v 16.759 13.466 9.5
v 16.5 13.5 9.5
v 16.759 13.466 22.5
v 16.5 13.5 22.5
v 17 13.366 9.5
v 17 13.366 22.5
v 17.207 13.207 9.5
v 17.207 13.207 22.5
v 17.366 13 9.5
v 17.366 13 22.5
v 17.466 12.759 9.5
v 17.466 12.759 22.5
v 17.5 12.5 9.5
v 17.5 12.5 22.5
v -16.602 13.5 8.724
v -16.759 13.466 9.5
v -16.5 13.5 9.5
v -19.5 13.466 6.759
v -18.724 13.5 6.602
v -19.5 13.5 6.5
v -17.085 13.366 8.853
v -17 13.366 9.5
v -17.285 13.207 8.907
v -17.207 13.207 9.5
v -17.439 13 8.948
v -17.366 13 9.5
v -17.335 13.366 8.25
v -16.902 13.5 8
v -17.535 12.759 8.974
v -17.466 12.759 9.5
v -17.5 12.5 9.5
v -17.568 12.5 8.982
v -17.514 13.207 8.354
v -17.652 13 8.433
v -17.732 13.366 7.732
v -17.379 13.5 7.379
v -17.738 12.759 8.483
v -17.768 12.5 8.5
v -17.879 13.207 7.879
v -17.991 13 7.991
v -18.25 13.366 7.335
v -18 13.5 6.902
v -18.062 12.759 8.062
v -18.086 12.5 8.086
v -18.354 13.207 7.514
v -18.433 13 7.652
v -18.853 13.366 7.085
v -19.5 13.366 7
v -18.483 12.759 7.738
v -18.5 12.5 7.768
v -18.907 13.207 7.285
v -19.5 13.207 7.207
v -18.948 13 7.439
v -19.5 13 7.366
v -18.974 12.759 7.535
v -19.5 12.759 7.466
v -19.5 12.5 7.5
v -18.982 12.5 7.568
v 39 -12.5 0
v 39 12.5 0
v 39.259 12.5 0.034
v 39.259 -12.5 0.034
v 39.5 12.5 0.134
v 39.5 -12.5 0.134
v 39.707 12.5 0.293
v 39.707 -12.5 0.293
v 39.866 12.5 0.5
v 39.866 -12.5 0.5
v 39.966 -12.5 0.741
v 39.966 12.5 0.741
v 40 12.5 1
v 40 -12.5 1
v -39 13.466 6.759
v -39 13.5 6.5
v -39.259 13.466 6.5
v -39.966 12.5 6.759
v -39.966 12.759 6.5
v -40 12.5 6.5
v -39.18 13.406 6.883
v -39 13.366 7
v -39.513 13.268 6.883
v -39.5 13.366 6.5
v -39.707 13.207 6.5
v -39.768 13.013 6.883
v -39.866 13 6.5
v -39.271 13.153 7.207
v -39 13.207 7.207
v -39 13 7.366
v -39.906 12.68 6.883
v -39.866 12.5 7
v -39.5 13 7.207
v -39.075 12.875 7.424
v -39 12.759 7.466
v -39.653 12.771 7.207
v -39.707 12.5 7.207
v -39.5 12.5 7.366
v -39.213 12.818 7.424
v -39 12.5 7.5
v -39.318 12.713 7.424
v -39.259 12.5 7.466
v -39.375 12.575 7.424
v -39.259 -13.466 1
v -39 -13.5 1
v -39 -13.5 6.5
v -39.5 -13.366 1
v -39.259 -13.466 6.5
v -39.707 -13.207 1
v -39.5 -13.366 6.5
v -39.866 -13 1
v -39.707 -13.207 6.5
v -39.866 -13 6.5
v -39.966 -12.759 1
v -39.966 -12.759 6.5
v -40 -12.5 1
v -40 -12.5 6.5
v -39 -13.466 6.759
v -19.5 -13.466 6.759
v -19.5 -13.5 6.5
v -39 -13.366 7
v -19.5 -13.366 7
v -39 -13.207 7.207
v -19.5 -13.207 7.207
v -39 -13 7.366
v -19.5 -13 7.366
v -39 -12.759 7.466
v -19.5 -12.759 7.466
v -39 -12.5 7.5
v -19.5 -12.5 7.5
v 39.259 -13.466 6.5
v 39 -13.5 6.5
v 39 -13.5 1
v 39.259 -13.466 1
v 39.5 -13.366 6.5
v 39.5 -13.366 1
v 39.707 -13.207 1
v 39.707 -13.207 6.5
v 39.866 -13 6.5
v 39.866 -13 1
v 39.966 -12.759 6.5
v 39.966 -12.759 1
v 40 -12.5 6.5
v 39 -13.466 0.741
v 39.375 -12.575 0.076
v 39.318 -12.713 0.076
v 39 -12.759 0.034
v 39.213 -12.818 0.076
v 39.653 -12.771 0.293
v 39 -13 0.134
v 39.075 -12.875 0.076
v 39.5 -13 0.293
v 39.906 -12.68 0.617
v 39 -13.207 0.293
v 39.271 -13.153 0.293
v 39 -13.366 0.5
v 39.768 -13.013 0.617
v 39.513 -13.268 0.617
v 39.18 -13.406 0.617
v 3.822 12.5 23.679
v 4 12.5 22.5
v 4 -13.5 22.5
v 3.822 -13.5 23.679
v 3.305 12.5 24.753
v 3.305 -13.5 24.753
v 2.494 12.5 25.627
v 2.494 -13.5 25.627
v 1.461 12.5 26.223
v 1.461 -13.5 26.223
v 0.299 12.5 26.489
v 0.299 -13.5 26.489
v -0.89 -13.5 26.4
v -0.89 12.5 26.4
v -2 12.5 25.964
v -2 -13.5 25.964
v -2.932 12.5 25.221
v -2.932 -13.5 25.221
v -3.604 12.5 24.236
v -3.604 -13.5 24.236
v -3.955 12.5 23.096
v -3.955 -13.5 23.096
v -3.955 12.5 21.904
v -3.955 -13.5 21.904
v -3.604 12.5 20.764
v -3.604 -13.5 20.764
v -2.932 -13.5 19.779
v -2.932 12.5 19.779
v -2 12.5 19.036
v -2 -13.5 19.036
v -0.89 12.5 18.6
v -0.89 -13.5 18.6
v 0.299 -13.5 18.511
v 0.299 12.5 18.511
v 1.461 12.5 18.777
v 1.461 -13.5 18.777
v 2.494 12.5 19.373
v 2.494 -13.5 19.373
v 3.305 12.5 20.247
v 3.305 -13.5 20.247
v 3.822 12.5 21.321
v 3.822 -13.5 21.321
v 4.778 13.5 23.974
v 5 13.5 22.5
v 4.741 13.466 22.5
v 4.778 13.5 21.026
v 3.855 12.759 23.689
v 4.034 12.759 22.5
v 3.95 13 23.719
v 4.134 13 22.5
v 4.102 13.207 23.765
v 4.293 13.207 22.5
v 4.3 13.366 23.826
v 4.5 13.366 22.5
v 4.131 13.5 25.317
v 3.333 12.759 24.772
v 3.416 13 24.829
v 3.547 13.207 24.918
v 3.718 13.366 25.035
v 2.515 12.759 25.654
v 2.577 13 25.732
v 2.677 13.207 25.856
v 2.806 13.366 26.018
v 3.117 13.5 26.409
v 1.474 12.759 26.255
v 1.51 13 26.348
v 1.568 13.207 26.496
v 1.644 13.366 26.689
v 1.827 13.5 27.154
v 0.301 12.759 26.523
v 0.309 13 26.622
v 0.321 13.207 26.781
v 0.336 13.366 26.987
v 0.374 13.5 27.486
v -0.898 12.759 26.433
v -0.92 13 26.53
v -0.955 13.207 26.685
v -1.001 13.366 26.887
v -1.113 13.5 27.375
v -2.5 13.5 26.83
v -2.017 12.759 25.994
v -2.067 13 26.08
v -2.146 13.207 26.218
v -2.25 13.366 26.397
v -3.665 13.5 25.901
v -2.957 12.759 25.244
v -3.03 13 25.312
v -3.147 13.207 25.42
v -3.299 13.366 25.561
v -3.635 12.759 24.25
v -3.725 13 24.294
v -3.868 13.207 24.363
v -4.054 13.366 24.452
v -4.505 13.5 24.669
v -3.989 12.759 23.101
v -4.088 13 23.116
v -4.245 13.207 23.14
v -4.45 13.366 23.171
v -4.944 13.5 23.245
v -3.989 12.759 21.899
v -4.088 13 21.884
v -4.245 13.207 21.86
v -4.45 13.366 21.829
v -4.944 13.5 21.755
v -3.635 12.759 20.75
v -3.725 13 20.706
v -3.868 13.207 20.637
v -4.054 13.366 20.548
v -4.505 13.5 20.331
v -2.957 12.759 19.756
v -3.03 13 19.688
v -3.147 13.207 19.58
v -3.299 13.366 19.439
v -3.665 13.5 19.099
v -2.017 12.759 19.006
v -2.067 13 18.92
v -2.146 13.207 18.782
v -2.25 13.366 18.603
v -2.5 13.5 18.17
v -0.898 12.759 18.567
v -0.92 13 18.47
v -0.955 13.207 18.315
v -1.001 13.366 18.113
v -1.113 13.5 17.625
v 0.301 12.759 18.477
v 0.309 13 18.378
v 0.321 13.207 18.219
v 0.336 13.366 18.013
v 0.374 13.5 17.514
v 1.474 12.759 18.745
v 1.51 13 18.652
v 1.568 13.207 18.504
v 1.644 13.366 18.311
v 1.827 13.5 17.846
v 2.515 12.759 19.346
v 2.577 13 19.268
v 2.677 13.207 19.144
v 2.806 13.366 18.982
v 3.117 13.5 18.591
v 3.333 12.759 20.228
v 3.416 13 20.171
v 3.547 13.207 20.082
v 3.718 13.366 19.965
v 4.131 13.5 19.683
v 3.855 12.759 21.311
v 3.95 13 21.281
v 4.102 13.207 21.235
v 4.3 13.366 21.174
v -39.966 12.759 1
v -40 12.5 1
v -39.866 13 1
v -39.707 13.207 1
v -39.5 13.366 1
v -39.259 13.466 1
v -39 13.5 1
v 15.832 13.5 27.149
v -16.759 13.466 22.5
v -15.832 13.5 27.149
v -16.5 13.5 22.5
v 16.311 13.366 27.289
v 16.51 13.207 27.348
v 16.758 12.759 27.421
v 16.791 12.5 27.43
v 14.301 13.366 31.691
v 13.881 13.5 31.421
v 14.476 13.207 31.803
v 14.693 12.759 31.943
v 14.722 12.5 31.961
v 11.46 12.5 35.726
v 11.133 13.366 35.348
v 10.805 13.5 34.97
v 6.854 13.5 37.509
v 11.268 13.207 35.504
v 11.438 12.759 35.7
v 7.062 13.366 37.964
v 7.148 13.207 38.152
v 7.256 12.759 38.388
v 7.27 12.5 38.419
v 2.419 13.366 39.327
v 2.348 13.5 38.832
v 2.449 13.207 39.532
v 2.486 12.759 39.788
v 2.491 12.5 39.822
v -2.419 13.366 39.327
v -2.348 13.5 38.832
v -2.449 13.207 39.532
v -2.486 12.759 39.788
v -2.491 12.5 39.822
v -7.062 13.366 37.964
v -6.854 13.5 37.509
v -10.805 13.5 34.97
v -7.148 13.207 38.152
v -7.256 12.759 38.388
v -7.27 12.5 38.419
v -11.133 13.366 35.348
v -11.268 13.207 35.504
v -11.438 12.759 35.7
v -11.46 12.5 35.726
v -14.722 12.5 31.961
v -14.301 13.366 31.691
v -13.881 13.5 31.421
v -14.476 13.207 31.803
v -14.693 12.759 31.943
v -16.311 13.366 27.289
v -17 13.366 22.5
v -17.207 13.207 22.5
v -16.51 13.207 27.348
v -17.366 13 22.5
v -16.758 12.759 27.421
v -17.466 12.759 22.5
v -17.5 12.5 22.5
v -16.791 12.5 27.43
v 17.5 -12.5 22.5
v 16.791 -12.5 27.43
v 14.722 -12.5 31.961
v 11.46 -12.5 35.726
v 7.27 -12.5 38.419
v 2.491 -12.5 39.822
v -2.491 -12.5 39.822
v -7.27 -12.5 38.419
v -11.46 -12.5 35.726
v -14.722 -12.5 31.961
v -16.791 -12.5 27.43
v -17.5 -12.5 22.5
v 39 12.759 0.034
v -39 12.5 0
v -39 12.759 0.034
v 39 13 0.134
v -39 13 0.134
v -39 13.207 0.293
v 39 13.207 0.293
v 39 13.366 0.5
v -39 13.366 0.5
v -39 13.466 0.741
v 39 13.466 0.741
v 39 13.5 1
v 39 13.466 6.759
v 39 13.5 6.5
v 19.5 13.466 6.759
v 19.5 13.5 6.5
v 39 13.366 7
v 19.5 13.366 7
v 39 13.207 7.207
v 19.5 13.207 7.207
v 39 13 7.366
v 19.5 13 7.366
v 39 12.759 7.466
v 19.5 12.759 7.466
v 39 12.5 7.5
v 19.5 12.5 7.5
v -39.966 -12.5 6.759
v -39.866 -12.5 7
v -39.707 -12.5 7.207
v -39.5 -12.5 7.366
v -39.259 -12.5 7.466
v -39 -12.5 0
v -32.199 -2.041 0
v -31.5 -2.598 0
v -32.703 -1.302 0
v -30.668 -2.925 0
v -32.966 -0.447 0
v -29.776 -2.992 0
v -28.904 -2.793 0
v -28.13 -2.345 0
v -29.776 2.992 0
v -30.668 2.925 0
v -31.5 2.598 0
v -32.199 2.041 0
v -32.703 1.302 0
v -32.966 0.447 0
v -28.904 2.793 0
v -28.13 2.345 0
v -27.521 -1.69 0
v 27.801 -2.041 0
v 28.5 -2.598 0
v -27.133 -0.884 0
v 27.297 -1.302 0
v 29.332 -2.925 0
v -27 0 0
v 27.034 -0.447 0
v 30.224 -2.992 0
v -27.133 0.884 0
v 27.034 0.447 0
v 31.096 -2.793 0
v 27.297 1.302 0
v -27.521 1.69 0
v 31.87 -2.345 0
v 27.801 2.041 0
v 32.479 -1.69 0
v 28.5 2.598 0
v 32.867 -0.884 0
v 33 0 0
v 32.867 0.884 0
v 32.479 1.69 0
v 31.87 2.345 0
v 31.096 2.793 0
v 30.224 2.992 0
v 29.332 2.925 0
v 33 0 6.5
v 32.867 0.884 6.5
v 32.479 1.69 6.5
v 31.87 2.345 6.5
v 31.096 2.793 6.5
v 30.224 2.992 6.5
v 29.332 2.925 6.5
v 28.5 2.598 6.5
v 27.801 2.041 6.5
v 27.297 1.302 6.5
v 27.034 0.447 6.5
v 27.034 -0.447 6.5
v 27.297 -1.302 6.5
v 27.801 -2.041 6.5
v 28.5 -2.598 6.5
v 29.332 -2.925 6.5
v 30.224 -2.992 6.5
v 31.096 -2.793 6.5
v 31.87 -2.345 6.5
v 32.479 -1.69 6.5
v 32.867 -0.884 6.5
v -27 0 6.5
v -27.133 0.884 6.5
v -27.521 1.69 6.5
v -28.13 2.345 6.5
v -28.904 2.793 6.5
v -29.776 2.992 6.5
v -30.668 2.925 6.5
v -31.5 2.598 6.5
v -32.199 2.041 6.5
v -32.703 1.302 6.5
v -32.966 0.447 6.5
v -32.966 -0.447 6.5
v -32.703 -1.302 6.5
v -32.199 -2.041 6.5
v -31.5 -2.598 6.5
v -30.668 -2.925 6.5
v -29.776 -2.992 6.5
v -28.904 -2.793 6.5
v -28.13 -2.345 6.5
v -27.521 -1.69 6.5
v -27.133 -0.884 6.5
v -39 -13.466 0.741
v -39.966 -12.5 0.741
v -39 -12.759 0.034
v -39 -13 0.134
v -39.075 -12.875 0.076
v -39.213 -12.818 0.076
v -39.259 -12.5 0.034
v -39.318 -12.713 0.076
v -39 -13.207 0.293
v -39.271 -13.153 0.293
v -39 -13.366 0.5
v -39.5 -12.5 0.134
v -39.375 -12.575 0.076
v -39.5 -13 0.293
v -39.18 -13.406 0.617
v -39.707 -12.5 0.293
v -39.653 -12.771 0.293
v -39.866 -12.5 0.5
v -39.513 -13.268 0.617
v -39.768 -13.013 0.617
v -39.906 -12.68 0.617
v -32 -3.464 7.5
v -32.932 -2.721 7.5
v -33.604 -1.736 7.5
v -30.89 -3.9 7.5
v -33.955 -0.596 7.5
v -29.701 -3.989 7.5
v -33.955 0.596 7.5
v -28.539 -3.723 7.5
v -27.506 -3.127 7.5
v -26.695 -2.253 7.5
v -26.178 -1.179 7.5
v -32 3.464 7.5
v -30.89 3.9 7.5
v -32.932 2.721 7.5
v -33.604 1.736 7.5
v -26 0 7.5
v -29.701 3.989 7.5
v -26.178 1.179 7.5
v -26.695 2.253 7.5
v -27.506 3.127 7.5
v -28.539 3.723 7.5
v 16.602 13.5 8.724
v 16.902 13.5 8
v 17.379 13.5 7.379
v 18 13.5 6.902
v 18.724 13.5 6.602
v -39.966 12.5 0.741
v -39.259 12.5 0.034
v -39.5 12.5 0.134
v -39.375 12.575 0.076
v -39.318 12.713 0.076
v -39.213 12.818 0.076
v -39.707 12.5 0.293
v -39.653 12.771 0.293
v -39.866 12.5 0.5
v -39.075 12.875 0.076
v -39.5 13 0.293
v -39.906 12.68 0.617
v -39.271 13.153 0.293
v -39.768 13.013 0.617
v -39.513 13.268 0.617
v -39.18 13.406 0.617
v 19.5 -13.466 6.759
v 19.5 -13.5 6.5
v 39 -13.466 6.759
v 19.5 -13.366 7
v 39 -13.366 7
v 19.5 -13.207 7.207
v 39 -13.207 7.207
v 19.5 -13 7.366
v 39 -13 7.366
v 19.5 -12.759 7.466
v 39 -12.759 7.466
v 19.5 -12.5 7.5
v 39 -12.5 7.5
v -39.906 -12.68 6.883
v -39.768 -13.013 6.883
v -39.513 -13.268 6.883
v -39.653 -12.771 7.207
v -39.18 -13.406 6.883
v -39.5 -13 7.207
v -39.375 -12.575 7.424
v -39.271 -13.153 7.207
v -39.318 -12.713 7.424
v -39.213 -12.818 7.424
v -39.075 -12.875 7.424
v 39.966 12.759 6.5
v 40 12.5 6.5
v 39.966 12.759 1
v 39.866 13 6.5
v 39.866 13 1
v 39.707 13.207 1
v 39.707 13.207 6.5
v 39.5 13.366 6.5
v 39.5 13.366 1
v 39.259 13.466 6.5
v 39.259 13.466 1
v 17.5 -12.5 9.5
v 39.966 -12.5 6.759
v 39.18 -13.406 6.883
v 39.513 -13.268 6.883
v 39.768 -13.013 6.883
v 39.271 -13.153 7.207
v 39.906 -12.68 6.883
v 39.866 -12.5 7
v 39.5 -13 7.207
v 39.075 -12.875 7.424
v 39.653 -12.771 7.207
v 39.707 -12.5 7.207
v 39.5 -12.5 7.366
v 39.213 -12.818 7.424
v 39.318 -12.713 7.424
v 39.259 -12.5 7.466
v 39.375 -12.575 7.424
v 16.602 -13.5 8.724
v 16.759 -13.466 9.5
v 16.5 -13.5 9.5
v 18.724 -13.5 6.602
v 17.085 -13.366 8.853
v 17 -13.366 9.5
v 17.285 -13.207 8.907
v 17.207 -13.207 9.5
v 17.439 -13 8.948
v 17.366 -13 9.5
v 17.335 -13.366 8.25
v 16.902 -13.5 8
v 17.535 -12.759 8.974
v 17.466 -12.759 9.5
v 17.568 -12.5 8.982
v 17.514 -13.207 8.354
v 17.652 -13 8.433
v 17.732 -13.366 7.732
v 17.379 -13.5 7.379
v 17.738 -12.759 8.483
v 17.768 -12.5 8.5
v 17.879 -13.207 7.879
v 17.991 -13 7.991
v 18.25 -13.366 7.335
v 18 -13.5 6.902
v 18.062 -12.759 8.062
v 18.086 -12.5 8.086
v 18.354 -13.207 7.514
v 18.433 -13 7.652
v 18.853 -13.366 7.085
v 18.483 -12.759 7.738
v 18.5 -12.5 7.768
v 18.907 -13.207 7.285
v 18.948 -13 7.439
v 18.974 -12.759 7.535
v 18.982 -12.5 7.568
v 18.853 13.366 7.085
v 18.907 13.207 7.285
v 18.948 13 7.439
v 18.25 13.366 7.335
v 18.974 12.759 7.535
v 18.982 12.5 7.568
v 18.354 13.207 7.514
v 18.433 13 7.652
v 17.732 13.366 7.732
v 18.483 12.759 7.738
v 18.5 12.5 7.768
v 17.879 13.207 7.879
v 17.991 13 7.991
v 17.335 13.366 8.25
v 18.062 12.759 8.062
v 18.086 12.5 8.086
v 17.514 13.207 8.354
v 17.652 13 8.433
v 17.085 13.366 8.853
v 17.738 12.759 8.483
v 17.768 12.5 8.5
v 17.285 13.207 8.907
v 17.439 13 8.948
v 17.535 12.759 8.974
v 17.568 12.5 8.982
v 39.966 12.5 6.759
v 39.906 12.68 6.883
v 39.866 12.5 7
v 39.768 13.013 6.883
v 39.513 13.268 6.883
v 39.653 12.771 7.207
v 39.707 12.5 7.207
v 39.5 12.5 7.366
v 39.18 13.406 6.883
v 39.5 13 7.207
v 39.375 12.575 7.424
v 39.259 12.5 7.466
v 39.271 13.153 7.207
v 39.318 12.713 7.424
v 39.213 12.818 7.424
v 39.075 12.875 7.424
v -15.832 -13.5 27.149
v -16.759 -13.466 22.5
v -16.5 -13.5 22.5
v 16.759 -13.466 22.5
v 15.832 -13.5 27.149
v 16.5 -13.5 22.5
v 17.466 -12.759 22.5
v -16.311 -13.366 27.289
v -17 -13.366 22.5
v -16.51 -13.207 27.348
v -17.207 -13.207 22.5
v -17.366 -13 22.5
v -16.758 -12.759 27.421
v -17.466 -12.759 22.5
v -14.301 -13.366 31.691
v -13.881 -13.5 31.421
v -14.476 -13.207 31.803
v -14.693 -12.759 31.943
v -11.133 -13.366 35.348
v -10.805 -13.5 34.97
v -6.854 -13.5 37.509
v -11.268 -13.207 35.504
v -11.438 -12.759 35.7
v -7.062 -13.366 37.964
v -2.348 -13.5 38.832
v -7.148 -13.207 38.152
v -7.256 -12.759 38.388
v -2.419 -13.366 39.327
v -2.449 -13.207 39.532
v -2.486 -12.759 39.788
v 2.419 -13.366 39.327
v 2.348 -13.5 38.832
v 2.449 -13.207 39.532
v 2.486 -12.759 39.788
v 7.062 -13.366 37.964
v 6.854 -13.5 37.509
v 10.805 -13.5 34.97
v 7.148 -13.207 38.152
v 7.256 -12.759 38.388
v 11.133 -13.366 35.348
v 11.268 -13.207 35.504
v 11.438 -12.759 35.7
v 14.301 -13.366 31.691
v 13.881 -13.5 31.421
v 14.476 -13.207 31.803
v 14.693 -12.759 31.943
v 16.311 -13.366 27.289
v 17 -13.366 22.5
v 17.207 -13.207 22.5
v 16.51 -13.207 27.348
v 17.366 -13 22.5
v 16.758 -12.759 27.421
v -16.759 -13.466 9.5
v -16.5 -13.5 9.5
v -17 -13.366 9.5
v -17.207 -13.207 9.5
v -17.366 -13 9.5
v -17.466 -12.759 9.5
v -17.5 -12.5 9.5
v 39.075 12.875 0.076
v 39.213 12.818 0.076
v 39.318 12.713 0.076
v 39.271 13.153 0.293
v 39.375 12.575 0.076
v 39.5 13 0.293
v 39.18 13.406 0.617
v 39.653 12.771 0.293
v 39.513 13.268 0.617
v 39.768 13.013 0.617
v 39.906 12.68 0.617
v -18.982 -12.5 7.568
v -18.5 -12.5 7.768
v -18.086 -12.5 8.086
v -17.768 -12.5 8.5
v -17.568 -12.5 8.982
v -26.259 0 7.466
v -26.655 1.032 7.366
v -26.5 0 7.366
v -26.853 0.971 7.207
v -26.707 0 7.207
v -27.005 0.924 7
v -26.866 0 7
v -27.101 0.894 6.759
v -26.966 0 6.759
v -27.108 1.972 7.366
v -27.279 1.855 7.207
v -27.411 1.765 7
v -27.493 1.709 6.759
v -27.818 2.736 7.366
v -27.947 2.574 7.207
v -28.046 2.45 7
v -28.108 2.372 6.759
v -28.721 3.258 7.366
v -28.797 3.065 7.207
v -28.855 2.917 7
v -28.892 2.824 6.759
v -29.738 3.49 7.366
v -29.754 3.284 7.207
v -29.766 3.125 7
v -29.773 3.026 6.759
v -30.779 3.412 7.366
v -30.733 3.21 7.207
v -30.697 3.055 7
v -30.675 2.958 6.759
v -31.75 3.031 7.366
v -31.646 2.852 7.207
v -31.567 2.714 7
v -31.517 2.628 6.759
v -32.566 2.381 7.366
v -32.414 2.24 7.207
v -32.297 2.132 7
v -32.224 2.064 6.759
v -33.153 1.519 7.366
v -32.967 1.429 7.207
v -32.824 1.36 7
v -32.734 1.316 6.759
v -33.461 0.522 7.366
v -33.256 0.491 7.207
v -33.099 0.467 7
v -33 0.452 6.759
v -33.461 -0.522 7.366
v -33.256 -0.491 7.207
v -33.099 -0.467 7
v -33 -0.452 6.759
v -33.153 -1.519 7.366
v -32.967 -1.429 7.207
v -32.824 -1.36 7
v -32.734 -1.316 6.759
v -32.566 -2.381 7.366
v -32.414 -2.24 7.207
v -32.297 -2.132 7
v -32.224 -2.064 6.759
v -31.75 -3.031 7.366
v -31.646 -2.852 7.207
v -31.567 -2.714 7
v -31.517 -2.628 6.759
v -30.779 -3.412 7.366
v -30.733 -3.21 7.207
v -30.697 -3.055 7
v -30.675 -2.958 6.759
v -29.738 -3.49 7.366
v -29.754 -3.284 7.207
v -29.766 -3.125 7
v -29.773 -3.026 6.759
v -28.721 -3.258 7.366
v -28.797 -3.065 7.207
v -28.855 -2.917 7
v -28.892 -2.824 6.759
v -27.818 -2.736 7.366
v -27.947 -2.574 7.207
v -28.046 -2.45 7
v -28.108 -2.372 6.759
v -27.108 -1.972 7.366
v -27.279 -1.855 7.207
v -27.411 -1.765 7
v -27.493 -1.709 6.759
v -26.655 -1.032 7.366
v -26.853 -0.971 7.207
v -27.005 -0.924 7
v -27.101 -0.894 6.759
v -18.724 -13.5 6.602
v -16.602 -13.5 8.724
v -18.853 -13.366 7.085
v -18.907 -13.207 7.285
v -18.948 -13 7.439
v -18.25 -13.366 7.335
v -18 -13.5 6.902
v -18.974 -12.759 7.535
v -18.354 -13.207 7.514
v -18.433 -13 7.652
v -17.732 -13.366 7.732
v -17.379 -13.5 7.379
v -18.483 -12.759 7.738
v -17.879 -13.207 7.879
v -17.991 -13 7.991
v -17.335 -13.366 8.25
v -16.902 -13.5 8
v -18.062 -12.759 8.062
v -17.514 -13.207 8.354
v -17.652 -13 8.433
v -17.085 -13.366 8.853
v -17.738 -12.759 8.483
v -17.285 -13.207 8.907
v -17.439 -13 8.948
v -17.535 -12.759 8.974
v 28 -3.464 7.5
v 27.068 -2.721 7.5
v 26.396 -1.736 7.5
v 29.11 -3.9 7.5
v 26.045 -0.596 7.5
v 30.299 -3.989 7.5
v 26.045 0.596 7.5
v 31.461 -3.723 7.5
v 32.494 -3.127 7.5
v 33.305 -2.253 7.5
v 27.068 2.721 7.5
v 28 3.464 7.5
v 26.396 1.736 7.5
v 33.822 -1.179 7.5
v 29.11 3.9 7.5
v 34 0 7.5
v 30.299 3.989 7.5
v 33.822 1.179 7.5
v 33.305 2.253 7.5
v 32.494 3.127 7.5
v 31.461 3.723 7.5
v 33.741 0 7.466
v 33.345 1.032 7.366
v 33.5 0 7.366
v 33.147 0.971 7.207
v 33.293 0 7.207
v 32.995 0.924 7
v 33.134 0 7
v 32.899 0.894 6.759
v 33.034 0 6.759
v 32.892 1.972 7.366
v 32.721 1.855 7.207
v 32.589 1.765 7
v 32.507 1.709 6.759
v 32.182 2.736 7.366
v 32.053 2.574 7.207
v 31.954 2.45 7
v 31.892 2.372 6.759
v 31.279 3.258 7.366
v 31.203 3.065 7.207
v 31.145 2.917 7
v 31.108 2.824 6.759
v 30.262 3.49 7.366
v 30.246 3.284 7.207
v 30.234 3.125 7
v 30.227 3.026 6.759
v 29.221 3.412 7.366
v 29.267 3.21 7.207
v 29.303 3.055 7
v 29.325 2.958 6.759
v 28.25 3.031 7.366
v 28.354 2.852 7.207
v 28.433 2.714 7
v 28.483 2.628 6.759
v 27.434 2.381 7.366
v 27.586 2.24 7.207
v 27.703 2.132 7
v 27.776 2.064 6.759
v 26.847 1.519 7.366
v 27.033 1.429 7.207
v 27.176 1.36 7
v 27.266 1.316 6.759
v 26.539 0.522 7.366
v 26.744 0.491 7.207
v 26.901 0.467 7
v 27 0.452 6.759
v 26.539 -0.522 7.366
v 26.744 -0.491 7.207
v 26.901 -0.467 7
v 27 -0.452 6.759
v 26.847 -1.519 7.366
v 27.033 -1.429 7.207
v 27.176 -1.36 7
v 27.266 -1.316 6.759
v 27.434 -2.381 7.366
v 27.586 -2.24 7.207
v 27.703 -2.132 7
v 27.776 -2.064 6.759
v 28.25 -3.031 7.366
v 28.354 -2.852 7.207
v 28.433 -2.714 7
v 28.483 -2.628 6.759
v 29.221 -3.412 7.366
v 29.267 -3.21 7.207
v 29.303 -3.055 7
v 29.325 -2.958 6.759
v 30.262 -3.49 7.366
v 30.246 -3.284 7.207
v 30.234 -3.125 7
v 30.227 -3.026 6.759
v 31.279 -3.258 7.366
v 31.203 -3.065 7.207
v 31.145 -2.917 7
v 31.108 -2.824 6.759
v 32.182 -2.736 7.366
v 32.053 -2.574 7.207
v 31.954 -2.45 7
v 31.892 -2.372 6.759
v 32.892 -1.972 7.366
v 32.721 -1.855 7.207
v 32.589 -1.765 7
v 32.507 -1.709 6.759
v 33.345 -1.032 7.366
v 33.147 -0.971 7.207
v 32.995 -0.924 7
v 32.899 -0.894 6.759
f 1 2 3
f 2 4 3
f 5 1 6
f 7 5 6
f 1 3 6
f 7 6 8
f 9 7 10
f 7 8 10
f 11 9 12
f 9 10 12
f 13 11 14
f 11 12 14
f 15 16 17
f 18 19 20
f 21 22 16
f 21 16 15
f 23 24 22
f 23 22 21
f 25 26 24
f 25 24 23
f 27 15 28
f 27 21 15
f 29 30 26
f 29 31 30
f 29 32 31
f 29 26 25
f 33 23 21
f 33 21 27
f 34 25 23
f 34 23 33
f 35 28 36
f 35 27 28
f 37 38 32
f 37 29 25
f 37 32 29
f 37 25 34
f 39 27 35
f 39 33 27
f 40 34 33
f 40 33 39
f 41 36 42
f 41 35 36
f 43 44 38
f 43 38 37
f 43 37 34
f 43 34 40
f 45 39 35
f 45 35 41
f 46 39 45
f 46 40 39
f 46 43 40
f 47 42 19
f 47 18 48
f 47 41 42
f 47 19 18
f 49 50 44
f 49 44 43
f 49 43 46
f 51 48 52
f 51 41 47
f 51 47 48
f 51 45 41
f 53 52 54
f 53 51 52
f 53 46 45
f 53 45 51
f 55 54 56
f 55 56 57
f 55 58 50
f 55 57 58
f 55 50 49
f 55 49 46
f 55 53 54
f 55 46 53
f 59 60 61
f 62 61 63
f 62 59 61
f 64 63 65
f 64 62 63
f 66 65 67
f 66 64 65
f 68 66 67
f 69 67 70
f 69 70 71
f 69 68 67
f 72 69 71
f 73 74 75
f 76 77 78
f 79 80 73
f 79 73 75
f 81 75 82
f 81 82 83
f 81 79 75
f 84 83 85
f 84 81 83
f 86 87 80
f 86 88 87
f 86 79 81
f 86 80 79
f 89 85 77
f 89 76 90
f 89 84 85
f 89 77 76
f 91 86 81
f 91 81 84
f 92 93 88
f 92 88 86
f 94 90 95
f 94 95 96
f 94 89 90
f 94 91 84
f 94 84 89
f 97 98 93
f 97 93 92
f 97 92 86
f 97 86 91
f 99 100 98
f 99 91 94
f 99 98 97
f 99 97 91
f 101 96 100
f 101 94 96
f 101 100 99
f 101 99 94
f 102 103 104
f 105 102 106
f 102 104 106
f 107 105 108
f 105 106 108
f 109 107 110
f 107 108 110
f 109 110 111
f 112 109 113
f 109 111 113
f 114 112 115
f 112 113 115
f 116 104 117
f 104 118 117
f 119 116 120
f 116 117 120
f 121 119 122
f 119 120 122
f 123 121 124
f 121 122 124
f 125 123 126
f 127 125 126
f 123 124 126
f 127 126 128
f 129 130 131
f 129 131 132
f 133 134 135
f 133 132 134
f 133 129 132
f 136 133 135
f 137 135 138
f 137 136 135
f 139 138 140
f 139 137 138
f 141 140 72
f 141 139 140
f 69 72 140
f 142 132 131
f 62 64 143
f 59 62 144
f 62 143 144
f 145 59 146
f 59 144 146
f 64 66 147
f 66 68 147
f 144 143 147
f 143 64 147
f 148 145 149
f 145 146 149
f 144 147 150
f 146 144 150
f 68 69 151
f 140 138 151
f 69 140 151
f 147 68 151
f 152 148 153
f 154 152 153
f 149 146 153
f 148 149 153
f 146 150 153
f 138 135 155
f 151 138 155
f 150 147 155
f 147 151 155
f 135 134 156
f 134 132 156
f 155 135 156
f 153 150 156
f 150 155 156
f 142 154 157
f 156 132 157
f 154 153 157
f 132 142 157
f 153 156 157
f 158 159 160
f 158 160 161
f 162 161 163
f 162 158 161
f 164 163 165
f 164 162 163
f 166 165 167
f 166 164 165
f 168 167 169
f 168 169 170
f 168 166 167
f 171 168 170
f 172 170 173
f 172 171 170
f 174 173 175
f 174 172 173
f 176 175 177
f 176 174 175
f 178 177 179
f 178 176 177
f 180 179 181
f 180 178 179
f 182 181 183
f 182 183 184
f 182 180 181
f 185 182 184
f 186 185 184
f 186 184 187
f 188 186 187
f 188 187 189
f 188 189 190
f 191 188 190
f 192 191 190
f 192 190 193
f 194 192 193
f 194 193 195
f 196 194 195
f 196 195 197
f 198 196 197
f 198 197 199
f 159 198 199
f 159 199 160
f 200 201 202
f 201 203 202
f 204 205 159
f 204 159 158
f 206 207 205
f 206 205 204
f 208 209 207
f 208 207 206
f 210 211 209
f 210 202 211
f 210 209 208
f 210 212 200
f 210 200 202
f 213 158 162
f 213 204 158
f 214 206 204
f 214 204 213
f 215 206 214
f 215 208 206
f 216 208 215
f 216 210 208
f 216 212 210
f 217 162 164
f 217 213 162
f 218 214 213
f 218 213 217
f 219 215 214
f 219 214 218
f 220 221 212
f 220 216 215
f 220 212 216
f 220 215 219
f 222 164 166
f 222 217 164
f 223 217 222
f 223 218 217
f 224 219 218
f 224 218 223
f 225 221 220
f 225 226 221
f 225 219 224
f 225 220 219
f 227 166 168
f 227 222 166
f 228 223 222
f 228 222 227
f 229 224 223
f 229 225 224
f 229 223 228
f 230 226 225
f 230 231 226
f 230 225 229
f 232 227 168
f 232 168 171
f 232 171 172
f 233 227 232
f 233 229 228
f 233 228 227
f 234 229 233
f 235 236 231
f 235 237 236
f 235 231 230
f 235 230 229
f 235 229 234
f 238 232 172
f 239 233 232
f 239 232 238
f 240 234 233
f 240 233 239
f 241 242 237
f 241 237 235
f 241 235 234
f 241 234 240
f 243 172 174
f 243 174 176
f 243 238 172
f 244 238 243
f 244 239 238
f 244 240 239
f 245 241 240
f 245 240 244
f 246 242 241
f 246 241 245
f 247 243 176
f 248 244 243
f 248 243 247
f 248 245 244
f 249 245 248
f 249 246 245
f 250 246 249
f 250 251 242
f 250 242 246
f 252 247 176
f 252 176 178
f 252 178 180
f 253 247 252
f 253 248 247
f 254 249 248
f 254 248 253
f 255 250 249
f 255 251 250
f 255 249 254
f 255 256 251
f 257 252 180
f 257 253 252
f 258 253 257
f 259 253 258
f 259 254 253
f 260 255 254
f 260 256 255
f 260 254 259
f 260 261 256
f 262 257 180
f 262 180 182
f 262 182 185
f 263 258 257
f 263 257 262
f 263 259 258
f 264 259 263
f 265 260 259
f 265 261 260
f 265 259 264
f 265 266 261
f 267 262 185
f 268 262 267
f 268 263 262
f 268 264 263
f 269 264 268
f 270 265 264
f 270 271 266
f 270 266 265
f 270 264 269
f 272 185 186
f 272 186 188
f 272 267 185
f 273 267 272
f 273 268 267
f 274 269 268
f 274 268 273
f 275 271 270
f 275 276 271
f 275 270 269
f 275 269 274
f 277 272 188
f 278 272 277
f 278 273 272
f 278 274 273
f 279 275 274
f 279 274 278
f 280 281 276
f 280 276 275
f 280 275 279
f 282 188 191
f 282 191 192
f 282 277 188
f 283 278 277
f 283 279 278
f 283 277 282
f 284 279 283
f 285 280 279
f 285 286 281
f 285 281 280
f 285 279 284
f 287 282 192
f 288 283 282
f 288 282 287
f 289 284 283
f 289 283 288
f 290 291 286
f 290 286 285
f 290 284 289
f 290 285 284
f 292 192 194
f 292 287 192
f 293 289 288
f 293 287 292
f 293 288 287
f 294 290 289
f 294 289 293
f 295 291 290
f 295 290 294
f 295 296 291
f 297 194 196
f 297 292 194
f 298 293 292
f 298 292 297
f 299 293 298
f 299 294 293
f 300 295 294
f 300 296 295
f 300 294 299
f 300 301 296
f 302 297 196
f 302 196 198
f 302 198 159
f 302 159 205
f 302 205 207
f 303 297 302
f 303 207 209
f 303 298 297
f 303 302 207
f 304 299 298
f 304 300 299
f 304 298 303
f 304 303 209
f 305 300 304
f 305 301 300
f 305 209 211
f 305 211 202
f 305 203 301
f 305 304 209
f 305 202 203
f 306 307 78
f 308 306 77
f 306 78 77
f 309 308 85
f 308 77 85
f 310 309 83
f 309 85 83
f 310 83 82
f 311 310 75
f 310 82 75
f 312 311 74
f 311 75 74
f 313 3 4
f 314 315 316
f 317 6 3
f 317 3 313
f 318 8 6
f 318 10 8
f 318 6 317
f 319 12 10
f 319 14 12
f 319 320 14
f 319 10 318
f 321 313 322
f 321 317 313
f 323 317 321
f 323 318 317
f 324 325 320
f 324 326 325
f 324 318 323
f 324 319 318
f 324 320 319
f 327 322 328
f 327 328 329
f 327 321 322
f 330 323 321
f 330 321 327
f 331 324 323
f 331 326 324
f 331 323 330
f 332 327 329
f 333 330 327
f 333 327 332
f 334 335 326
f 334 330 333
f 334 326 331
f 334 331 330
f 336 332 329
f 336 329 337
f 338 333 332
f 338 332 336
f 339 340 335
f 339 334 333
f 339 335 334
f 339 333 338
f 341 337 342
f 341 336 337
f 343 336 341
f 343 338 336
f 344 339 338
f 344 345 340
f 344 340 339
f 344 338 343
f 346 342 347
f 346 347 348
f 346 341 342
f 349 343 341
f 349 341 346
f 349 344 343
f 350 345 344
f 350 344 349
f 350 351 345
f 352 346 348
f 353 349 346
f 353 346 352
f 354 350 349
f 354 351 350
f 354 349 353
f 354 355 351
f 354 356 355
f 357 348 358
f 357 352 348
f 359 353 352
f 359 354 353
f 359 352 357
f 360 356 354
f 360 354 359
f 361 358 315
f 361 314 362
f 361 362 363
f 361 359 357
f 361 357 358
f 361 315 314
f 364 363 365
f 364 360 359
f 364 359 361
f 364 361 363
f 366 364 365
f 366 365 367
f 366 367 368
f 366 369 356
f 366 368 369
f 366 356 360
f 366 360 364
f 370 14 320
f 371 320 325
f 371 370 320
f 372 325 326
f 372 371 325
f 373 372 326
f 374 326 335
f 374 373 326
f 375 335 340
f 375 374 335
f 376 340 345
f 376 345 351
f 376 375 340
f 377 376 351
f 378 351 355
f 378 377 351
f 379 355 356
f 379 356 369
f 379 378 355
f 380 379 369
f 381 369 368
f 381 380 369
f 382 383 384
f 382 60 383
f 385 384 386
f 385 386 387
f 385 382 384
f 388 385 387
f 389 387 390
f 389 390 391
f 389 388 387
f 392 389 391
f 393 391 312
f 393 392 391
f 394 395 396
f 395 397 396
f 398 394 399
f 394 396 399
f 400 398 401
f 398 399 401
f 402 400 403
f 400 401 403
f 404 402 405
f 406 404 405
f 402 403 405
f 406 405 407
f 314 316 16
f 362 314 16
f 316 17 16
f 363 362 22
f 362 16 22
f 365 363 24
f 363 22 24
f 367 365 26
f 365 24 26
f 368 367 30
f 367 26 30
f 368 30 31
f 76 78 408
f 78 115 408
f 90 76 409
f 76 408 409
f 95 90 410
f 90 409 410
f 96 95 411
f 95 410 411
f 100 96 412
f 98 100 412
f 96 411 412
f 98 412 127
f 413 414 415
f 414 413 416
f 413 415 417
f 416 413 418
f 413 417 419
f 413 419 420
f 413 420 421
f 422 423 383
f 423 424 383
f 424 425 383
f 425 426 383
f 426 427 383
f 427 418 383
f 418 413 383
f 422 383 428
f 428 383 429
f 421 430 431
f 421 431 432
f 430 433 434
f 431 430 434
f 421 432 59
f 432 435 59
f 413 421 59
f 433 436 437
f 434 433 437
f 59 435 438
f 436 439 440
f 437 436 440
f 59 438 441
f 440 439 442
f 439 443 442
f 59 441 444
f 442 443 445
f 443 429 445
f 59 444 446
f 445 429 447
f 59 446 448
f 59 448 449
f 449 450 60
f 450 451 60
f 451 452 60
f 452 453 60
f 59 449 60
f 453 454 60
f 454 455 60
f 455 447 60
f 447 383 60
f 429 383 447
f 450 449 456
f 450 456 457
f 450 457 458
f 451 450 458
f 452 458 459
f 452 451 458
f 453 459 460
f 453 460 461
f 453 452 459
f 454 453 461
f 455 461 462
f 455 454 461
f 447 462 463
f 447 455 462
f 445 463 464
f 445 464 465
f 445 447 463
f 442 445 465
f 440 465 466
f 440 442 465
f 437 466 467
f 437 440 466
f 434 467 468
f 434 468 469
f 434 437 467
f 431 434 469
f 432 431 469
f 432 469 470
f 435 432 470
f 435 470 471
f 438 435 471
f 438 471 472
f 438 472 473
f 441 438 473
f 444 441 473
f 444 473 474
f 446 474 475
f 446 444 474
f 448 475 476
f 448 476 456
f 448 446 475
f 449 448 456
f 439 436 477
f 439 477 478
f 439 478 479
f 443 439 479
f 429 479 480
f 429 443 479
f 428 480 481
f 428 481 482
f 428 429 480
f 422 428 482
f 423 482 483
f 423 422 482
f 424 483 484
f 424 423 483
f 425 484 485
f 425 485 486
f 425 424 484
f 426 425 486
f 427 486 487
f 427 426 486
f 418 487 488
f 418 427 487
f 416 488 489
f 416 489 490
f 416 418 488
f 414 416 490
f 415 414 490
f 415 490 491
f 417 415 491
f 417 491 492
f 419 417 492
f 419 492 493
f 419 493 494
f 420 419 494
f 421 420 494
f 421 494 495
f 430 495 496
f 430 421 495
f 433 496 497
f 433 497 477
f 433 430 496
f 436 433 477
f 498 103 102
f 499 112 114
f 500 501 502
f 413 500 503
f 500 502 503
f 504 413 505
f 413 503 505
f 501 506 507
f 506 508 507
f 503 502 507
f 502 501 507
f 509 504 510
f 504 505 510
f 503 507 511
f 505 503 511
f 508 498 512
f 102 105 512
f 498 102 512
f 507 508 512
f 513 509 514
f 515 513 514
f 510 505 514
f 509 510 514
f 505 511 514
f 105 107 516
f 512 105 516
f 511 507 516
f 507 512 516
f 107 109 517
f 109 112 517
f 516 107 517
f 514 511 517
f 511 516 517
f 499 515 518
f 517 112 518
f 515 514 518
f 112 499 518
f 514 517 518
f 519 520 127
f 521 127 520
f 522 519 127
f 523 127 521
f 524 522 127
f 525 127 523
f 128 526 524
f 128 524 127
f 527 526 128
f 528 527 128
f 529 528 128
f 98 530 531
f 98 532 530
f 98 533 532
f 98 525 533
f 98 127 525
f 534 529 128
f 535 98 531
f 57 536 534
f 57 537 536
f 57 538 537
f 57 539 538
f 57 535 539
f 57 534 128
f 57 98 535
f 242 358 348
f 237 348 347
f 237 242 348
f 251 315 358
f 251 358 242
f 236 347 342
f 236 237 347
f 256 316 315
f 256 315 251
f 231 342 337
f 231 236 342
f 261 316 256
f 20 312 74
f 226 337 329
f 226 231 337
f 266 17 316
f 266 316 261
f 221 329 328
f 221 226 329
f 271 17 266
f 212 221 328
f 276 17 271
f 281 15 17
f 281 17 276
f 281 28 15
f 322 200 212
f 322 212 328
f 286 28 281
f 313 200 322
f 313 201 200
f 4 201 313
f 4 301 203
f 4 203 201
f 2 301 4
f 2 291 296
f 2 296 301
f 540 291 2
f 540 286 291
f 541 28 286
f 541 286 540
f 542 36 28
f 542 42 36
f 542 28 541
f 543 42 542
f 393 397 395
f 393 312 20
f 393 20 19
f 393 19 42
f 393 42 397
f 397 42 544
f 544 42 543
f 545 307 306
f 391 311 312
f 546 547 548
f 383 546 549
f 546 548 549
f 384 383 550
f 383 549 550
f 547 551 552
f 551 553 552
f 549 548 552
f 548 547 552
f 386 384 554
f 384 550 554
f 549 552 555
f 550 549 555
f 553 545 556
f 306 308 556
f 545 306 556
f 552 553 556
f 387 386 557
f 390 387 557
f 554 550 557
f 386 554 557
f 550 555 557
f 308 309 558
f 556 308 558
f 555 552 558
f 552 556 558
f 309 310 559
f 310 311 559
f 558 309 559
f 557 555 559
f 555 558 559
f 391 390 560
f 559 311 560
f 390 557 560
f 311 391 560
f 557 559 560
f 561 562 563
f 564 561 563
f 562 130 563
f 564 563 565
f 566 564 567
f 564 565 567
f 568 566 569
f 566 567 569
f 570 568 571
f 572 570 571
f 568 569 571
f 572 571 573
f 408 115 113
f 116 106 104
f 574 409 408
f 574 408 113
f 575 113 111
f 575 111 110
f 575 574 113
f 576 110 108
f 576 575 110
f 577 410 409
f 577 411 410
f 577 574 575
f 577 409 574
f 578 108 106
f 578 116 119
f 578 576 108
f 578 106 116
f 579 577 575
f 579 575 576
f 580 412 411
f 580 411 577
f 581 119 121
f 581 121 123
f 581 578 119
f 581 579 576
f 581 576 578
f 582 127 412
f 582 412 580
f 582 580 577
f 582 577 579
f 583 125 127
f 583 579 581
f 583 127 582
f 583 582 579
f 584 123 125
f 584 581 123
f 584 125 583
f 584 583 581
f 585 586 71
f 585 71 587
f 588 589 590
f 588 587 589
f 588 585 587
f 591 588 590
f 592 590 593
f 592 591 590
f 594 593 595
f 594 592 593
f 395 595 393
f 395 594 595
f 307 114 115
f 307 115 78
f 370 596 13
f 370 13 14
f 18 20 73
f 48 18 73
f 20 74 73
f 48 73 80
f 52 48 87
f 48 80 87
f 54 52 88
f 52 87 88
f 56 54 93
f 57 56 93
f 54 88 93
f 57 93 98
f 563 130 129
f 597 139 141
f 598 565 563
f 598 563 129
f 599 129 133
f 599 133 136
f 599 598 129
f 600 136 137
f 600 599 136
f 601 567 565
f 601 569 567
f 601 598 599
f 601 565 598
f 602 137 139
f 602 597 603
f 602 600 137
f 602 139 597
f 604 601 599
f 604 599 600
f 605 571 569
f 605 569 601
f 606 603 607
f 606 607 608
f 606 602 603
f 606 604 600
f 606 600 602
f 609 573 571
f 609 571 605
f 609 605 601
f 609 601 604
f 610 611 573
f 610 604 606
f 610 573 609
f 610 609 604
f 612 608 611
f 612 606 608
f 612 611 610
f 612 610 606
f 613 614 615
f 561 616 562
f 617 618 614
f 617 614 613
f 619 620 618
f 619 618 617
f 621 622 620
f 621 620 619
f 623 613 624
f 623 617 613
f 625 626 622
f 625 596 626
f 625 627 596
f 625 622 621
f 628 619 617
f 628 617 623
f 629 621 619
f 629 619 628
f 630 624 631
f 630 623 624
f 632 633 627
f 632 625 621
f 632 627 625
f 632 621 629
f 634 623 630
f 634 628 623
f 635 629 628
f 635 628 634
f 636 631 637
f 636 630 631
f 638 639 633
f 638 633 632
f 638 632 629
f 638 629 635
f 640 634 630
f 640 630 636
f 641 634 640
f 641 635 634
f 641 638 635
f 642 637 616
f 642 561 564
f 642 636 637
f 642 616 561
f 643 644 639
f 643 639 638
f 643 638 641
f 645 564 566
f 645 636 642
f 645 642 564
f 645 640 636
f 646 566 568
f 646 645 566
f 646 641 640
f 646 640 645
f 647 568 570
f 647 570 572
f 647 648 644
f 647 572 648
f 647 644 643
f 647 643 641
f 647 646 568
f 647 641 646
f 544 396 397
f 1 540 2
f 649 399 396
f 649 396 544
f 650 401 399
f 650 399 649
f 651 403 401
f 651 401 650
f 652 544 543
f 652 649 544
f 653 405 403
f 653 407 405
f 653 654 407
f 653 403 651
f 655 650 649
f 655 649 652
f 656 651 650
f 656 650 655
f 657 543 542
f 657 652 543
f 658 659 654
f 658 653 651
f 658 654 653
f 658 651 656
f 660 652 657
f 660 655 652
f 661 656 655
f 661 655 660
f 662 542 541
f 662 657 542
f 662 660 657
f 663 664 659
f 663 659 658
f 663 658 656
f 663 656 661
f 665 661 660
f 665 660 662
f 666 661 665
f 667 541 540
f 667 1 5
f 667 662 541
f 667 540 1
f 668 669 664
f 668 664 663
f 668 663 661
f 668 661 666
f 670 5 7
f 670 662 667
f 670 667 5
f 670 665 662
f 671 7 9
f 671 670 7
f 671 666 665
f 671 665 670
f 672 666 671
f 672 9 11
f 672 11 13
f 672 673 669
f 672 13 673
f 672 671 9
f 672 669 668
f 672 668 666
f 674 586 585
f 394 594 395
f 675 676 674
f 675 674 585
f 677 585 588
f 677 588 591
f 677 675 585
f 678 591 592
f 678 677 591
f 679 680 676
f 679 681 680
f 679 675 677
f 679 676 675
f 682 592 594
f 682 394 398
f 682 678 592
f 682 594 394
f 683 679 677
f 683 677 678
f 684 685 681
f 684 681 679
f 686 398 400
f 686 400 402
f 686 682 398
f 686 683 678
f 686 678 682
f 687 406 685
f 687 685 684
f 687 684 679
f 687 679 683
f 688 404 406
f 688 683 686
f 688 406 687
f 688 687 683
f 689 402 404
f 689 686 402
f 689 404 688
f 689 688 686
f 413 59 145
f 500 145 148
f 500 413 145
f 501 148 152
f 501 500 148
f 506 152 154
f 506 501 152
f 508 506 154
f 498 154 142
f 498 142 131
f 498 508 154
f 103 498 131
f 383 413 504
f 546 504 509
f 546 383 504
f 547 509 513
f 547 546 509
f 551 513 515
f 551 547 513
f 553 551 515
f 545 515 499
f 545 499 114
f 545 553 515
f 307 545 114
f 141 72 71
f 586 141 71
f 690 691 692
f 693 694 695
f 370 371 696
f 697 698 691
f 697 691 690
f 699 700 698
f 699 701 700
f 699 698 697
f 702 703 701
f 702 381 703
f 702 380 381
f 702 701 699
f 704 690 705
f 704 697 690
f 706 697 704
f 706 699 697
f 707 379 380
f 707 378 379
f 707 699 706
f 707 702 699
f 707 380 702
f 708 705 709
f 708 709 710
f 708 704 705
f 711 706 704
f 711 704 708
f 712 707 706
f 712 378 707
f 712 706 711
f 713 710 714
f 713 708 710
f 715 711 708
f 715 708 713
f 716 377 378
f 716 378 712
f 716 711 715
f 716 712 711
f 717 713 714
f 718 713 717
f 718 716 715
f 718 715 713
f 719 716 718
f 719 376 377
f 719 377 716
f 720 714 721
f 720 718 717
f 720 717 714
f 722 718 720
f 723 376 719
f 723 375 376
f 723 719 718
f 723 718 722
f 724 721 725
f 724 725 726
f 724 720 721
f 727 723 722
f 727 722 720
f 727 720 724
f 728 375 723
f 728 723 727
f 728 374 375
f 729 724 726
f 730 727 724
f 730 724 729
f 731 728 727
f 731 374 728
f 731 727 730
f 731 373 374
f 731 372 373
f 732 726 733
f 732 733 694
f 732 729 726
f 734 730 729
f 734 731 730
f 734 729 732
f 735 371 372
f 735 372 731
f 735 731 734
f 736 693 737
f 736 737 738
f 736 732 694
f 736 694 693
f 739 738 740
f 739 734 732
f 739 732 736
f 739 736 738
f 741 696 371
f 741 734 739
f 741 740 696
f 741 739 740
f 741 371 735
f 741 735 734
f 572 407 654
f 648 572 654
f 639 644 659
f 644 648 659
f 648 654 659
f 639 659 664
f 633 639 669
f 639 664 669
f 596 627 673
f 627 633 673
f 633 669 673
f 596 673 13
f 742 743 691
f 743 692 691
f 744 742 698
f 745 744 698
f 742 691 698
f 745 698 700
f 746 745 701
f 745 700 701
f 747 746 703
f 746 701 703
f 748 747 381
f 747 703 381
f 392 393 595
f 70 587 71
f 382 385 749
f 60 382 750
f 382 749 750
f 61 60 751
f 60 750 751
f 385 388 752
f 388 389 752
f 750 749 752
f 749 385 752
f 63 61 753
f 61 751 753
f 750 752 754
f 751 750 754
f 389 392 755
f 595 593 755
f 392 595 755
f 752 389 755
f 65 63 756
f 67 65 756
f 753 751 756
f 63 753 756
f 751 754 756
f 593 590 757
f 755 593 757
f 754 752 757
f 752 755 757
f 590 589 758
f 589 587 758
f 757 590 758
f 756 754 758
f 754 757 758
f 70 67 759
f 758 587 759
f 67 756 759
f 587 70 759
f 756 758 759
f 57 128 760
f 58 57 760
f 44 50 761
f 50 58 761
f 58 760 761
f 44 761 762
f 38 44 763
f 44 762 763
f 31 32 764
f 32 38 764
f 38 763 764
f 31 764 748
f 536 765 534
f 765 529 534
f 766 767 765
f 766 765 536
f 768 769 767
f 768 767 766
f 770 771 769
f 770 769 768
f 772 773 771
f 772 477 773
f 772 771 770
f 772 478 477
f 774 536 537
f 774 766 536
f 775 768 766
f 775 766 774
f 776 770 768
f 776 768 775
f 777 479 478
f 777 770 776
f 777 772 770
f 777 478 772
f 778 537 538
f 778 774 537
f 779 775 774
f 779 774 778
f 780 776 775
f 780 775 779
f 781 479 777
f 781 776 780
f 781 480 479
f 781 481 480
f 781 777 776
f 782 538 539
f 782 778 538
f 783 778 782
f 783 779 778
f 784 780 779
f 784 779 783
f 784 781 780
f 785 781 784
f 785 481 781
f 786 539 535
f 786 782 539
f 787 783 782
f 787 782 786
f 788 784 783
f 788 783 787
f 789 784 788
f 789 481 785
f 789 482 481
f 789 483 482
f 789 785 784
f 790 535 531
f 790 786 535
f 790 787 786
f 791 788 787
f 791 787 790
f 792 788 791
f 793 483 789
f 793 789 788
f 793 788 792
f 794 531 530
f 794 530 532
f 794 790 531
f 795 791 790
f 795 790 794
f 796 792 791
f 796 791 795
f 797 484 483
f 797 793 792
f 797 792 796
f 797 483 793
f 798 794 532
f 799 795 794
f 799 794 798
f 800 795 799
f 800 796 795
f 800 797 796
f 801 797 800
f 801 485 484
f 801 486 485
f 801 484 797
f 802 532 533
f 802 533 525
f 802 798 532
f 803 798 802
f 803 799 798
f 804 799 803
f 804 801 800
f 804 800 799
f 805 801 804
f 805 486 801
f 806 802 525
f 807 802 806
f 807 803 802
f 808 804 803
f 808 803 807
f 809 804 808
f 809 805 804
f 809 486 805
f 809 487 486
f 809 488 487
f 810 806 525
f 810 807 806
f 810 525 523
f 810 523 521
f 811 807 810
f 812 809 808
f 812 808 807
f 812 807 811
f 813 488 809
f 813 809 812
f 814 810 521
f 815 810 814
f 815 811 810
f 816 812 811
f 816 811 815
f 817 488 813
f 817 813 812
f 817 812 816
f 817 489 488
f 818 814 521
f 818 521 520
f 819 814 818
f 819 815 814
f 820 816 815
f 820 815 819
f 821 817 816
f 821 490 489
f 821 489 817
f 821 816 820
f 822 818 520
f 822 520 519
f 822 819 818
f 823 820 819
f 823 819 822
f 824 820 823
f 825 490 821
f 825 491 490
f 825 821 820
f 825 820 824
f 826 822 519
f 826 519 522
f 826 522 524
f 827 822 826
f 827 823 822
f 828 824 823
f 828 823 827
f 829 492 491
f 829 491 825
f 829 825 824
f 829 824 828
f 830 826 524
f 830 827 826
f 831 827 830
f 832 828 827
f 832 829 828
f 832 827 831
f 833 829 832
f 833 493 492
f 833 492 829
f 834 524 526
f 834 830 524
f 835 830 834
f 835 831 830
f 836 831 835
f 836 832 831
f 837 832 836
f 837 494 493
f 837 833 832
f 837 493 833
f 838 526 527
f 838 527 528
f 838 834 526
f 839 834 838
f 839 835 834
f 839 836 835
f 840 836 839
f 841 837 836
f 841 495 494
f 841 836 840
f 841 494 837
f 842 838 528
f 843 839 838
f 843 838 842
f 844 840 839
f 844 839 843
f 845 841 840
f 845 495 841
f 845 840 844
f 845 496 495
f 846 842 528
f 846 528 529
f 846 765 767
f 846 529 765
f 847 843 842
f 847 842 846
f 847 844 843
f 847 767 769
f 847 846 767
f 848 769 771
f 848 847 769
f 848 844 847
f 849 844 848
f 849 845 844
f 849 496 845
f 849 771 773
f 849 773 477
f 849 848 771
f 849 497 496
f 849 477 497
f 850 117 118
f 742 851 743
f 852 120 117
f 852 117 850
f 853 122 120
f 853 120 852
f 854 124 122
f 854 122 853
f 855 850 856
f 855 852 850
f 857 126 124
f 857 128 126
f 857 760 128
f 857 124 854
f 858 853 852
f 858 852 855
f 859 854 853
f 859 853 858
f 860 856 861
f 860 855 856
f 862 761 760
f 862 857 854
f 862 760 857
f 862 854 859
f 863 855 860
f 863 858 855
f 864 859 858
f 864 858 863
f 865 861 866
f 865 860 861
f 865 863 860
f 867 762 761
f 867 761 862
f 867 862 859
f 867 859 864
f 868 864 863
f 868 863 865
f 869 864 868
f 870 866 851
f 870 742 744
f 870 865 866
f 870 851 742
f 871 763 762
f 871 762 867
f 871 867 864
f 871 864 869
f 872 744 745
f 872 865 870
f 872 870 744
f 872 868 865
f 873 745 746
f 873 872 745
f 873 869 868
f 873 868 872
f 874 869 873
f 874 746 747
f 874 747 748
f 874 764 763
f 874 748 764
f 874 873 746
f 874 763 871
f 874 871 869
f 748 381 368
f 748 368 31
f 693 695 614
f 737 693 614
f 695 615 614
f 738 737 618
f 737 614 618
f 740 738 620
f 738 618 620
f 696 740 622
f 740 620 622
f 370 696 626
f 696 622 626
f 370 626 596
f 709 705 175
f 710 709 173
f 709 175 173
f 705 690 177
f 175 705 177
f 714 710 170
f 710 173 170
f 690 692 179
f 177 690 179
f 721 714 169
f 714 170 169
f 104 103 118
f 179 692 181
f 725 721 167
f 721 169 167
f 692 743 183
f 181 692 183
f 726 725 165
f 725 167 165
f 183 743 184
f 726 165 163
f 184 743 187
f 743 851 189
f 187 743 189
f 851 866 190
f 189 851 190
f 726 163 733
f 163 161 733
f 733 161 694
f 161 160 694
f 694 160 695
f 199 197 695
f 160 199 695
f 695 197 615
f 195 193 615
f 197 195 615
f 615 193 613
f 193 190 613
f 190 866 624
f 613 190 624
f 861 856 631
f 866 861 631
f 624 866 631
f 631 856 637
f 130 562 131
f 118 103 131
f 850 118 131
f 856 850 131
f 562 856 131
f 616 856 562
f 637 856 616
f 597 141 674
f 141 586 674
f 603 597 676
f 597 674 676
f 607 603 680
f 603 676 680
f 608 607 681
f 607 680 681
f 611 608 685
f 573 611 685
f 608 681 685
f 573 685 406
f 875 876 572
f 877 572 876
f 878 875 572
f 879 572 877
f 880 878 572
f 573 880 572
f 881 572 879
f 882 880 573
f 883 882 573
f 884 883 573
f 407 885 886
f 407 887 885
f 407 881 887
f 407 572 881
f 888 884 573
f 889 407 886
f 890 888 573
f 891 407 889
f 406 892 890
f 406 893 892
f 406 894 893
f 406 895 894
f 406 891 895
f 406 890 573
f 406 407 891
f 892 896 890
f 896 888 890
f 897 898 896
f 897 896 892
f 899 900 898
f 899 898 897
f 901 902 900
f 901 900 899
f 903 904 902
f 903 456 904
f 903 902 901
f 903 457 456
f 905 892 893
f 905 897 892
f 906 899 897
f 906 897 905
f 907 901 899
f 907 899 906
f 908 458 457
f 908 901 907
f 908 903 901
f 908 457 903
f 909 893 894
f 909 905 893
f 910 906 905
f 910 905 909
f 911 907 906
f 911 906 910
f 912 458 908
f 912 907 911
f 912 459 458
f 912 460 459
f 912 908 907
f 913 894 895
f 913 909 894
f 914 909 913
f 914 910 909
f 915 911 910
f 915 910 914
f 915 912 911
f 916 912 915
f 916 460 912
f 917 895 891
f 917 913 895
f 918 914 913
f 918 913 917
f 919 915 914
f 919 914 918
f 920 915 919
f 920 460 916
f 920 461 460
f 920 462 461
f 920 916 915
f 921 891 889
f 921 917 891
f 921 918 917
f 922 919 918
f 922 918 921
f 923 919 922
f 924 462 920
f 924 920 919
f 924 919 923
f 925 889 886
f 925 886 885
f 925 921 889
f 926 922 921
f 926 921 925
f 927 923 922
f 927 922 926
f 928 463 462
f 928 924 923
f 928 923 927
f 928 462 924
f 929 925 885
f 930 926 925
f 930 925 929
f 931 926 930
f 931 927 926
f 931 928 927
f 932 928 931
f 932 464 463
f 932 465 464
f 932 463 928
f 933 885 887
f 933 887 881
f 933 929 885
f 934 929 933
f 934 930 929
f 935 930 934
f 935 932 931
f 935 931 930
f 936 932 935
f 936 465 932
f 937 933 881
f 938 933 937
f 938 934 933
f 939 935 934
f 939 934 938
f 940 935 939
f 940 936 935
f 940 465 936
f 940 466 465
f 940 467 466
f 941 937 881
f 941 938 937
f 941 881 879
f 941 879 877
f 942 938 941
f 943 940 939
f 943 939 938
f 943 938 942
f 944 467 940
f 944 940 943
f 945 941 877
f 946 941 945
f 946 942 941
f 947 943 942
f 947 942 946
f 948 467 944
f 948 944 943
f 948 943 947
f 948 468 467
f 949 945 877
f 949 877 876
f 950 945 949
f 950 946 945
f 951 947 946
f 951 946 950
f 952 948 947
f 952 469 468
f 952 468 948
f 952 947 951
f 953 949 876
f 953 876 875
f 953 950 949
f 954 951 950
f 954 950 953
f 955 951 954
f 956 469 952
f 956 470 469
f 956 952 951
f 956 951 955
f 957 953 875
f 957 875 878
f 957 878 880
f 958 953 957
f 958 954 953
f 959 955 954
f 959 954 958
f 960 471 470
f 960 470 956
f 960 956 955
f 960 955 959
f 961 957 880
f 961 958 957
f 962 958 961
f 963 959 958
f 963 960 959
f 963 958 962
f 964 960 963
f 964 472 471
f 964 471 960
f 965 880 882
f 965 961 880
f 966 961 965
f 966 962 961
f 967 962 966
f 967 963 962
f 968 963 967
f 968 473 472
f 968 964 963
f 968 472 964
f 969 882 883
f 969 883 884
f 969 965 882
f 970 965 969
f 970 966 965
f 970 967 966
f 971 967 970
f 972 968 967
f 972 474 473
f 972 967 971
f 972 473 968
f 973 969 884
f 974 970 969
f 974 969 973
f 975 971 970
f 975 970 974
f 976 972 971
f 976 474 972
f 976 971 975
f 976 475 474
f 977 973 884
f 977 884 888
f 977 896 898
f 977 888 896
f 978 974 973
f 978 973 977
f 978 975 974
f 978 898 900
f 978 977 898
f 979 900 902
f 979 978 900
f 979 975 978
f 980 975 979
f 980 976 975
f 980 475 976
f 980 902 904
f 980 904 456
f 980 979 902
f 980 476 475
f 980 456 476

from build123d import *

# Parameters (mm, degrees)
F0_W     = 80
F0_H     = 27
F0_R     = 3
F1_DEPTH = 7.5
F2_R     = 4
F3_DEPTH = 13.5
F4_R     = 2
F5_R     = 1
F6_R     = 1


with BuildPart() as f1:
    # F0 (on Top) → F1 (new body)
    with BuildSketch(Plane.XY):
        Rectangle(F0_W, F0_H)
        with Locations((-30, 0)):
            Circle(F0_R, mode=Mode.SUBTRACT)
        with Locations((30, 0)):
            Circle(F0_R, mode=Mode.SUBTRACT)
    extrude(amount=F1_DEPTH)

    # F2 (on Front) → F3 (join, symmetric)
    with BuildSketch(Plane.XZ):
        with BuildLine():
            Line((17.5, 2.5), (17.5, 22.5))
            ThreePointArc((17.5, 22.5), (0, 40), (-17.5, 22.5))
            Line((-17.5, 22.5), (-17.5, 2.5))
            Line((-17.5, 2.5), (17.5, 2.5))
        make_face()
        with Locations((0, 22.5)):
            Circle(F2_R, mode=Mode.SUBTRACT)
    extrude(amount=F3_DEPTH, both=True)

    # F4
    f4_edges = [f1.edges().sort_by_distance(p)[0] for p in [
        (17.5, 0, 7.5),
        (-17.5, 0, 7.5),
    ]]
    fillet(f4_edges, radius=F4_R)

    # F5
    f5_edges = [f1.edges().sort_by_distance(p)[0] for p in [
        (-40, -13.5, 3.75),
        (-40, 13.5, 3.75),
        (40, -13.5, 3.75),
        (40, 13.5, 3.75),
    ]]
    fillet(f5_edges, radius=F5_R)

    # F6
    f6_edges = [f1.edges().sort_by_distance(p)[0] for p in [
        (-29.25, -13.5, 7.5),
        (-39.707107, -13.207107, 7.5),
        (-19.5, 0, 7.5),
        (-40, 0, 7.5),
        (-29.25, 13.5, 7.5),
        (-39.707107, 13.207107, 7.5),
        (-33, 0, 7.5),
        (-18.085786, 13.5, 8.085786),
        (-17.5, 0, 9.5),
        (-18.085786, -13.5, 8.085786),
        (-17.5, -13.5, 16),
        (-17.5, 0, 22.5),
        (-17.5, 13.5, 16),
        (0, 13.5, 40),
        (0, -13.5, 40),
        (17.5, 0, 22.5),
        (17.5, -13.5, 16),
        (17.5, 0, 9.5),
        (17.5, 13.5, 16),
        (29.25, 13.5, 7.5),
        (39, 13.5, 3.75),
        (18.085786, 13.5, 8.085786),
        (0, 13.5, 0),
        (-39, 13.5, 3.75),
        (-4, 13.5, 22.5),
        (18.085786, -13.5, 8.085786),
        (19.5, 0, 7.5),
        (29.25, -13.5, 7.5),
        (39.707107, -13.207107, 7.5),
        (40, 0, 7.5),
        (39.707107, 13.207107, 7.5),
        (27, 0, 7.5),
    ]]
    fillet(f6_edges, radius=F6_R)


solid = f1.part
